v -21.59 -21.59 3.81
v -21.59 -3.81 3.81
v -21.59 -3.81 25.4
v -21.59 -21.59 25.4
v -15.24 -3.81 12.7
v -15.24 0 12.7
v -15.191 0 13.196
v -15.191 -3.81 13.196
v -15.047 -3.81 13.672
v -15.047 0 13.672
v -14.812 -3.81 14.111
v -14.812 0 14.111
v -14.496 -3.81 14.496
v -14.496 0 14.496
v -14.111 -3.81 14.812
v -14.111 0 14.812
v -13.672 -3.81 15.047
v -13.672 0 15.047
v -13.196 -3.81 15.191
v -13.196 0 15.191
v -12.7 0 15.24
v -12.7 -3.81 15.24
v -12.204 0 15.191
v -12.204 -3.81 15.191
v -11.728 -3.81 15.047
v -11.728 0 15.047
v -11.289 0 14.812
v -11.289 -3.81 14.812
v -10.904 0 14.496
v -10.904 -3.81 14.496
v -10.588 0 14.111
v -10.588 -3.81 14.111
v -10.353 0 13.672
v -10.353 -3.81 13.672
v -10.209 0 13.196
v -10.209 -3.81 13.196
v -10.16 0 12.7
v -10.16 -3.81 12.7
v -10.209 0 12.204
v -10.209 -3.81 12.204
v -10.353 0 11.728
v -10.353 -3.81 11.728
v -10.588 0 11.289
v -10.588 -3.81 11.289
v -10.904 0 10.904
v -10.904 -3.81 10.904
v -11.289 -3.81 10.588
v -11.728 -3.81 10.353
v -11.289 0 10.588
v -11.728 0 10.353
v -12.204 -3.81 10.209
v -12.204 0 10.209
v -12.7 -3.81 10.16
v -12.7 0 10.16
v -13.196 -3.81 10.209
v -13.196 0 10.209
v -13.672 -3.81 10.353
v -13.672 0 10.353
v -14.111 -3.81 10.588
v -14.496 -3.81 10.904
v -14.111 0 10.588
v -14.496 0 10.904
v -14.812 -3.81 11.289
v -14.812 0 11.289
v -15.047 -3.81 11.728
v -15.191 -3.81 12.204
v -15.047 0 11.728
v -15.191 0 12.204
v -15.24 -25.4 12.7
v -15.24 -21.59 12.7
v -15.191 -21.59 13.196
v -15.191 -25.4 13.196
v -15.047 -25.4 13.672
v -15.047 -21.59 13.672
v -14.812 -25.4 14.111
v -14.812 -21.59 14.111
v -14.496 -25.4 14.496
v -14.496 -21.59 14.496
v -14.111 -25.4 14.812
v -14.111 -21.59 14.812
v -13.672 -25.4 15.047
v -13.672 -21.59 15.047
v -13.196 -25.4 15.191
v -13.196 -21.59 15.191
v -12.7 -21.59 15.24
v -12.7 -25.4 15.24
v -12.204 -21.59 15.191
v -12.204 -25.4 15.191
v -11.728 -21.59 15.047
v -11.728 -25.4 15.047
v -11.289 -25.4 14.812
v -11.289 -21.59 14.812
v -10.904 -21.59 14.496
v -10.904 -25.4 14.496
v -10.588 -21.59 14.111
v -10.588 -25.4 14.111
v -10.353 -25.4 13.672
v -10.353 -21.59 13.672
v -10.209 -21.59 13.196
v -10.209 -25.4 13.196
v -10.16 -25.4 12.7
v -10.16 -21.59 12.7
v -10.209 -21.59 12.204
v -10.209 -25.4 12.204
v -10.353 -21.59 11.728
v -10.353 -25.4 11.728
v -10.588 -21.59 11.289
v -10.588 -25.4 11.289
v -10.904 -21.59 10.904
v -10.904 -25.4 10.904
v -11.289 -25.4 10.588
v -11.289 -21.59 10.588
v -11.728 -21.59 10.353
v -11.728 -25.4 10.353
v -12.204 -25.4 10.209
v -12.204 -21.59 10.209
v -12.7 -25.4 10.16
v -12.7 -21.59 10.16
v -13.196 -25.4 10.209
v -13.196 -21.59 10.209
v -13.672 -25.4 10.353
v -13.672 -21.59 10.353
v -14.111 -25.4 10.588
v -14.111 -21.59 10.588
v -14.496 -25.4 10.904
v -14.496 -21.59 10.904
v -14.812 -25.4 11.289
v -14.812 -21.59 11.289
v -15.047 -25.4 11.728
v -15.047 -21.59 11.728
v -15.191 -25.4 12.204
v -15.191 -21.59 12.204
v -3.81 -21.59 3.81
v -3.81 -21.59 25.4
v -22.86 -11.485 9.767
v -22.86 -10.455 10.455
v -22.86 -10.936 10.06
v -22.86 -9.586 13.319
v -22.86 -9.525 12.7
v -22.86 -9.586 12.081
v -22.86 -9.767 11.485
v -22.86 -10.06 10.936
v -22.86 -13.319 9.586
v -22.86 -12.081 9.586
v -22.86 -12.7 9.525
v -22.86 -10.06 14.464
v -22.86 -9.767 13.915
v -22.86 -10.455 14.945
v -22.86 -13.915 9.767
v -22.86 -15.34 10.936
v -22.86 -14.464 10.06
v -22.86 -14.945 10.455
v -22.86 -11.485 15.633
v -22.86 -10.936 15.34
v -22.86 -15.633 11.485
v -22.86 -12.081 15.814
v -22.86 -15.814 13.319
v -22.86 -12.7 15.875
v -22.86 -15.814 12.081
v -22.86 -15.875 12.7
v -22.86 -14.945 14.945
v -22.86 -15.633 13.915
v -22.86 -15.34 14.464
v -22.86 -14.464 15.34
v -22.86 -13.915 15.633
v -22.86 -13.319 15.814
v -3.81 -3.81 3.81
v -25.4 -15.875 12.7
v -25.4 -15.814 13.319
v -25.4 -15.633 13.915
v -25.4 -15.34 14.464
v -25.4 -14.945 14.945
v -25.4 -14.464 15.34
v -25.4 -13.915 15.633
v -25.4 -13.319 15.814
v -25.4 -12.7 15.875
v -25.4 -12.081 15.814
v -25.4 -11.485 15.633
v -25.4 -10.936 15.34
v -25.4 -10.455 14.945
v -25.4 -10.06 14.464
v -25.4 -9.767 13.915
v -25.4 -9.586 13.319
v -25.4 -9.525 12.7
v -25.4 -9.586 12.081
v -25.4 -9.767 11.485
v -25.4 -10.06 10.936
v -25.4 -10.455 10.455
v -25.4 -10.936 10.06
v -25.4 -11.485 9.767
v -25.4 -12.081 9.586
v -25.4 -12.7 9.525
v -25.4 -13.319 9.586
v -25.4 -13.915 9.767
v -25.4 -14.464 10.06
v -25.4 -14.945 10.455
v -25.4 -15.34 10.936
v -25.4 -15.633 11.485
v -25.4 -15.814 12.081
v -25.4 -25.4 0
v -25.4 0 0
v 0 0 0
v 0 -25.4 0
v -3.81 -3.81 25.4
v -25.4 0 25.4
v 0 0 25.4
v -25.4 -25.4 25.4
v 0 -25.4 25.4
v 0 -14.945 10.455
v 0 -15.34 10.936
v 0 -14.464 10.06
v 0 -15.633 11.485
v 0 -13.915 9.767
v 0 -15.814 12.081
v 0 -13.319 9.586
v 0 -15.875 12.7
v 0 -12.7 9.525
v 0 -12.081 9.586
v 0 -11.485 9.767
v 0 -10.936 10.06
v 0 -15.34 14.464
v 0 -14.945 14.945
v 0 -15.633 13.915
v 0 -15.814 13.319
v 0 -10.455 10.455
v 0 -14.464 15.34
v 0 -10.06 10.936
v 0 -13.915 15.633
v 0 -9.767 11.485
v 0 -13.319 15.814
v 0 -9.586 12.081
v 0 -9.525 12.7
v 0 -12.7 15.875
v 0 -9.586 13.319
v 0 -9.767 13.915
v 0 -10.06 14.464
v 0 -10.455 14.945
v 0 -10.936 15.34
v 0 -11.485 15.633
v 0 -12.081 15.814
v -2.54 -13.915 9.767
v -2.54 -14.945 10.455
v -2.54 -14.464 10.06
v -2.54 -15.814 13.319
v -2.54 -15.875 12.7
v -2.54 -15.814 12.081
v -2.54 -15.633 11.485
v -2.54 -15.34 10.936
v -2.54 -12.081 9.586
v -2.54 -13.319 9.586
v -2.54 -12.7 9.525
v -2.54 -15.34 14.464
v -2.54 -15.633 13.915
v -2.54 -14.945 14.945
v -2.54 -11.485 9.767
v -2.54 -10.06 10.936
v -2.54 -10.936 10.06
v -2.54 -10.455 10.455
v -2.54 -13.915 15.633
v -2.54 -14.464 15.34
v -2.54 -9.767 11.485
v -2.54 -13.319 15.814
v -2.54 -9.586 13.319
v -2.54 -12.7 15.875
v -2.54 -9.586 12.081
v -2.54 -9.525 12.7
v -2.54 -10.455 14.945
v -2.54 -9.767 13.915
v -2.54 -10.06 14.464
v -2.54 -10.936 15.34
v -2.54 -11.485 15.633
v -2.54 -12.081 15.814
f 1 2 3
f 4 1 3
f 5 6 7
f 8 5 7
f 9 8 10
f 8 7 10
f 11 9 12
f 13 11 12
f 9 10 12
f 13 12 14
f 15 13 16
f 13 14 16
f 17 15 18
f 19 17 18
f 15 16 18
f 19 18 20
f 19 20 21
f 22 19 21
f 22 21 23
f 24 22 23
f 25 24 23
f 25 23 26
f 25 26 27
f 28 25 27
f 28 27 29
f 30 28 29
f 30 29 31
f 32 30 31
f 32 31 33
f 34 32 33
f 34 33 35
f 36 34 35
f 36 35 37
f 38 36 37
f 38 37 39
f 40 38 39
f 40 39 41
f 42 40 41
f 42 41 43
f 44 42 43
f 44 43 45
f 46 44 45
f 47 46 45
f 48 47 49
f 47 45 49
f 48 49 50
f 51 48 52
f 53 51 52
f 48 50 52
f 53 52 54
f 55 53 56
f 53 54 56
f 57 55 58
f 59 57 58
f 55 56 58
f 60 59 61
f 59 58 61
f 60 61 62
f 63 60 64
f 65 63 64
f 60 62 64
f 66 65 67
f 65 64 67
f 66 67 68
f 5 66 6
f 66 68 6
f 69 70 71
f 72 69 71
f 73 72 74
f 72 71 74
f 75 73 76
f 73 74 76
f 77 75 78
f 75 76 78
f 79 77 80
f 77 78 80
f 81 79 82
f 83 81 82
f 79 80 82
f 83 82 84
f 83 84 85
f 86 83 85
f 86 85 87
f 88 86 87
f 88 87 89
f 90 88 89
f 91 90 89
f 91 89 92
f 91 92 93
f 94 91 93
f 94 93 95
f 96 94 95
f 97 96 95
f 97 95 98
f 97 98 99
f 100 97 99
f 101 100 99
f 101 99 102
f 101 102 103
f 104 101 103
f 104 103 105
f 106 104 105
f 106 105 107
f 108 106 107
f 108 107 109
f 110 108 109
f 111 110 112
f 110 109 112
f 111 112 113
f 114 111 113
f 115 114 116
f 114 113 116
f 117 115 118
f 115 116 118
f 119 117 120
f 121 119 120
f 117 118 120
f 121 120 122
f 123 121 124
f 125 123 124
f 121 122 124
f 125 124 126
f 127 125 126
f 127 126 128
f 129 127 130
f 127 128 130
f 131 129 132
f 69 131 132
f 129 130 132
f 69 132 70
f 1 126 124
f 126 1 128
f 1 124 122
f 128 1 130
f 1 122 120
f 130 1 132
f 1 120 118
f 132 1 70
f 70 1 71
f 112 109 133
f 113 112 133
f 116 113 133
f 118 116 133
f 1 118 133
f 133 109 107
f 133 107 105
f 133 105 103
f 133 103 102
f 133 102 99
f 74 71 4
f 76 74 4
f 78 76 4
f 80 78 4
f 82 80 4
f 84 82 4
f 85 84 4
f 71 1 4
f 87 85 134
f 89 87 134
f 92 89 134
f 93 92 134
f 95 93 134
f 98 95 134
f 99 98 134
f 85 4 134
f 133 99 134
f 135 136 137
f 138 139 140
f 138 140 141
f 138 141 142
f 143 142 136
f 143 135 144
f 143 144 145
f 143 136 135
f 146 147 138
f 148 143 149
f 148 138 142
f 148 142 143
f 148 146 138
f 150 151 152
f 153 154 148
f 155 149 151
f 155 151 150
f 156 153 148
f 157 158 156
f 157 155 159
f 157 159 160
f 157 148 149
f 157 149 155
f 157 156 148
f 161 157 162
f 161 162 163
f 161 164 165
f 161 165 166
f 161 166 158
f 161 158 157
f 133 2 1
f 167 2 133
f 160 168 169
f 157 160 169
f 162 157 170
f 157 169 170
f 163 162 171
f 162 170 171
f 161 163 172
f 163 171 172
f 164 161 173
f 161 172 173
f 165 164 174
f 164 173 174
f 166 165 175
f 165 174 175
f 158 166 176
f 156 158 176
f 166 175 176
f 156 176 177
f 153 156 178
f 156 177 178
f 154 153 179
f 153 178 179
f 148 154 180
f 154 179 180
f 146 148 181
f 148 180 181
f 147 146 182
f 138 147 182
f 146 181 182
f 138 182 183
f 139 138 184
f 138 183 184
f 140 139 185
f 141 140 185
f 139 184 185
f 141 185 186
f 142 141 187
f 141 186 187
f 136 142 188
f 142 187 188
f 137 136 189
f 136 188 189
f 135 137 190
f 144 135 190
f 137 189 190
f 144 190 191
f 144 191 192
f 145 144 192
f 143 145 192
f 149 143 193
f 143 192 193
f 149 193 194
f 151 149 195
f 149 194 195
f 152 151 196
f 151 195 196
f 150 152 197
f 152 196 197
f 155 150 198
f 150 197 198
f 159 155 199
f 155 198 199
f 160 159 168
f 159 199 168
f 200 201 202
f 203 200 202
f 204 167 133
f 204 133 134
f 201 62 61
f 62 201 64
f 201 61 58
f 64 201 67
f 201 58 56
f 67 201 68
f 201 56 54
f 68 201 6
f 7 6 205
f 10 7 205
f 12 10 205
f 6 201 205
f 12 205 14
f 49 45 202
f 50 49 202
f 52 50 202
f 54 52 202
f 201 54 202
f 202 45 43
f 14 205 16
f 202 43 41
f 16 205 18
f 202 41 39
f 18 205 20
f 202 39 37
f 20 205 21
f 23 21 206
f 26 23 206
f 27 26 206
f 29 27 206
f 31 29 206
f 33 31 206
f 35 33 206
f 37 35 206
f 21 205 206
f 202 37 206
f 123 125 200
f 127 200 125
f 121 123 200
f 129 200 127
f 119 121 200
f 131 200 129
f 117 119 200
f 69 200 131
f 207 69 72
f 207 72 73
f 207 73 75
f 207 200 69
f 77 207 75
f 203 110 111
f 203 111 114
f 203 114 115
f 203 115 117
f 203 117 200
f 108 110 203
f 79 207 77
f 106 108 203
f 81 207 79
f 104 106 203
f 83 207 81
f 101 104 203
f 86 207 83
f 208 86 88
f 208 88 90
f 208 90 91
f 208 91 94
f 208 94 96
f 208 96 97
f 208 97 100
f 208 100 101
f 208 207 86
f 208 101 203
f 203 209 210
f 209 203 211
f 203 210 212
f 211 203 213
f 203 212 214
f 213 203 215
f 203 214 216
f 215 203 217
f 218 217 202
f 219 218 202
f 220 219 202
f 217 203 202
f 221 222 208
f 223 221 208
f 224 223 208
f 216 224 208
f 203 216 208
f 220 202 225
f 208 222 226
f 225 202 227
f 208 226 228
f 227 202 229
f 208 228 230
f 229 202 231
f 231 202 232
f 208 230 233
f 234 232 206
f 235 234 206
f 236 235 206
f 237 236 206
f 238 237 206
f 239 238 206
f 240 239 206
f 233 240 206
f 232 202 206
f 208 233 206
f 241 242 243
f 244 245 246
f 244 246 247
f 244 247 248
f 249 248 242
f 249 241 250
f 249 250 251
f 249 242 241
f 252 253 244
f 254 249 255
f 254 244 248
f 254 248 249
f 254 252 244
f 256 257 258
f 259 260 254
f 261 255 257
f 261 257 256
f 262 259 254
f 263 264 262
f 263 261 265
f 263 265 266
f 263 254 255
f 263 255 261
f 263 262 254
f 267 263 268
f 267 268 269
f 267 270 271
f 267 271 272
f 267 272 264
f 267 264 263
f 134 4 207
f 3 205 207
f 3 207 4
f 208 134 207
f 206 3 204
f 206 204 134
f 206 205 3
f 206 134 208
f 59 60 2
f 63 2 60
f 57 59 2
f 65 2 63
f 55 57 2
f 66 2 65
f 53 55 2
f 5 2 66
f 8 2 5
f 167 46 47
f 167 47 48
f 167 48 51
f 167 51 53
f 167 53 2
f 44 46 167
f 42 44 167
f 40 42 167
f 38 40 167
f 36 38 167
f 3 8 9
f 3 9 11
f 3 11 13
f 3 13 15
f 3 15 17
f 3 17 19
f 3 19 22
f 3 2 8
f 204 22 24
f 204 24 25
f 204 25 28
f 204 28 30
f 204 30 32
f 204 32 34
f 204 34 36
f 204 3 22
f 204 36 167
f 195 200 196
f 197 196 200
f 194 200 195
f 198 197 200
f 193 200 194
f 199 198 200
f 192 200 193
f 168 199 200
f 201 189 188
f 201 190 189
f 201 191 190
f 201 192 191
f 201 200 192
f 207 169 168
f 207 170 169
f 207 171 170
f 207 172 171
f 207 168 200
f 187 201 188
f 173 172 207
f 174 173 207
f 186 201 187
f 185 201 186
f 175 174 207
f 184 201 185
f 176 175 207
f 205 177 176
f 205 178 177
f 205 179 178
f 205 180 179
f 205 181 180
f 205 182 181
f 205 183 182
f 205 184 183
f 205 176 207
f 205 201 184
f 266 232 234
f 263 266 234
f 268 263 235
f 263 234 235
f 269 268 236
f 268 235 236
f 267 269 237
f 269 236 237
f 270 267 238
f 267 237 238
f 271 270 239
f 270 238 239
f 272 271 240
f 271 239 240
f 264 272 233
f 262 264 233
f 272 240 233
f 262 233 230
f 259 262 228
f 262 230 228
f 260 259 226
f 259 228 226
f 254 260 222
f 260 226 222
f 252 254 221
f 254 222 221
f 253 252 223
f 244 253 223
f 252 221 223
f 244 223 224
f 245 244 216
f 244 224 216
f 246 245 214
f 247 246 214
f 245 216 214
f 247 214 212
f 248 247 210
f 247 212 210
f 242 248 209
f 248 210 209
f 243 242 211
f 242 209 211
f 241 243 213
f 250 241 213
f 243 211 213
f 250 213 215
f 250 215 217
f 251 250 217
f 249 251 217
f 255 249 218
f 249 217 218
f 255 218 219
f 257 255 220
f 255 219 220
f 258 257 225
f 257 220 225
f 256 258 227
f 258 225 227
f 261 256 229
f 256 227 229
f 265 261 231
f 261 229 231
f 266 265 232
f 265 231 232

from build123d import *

# Parameters (mm, degrees)
F0_W     = 25.4
F0_H     = 25.4
F1_DEPTH = 25.4
F2_T     = -3.81
F5_D     = 5.08
F5_DEPTH = 50.8
F4_R     = 3.175
F6_DEPTH = 2.54
F7_R     = 3.175
F8_DEPTH = 2.54


with BuildPart() as f1:
    # F0 (on Front) → F1 (new body)
    with BuildSketch(Plane.XZ):
        with Locations((-12.7, 12.7)):
            Rectangle(F0_W, F0_H)
    extrude(amount=F1_DEPTH)

    # F2
    f2_openings = [f1.faces().sort_by_distance(p)[0] for p in [
        (-12.7, -12.7, 25.4),
    ]]
    offset(amount=F2_T, openings=f2_openings)

    # F5
    with Locations(Plane.XZ.offset(25.4)):
        with Locations((-12.7, 12.7)):
            Hole(F5_D / 2, depth=F5_DEPTH)

    # F4 (on face) → F6 (cut)
    with BuildSketch(Plane.YZ):
        with Locations((-12.7, 12.7)):
            Circle(F4_R)
    extrude(amount=-F6_DEPTH, mode=Mode.SUBTRACT)

    # F7 (on face) → F8 (cut)
    with BuildSketch(Plane(origin=(-25.4, 0, 0), x_dir=(0, -1, 0), z_dir=(-1, 0, 0))):
        with Locations((12.7, 12.7)):
            Circle(F7_R)
    extrude(amount=-F8_DEPTH, mode=Mode.SUBTRACT)


solid = f1.part
